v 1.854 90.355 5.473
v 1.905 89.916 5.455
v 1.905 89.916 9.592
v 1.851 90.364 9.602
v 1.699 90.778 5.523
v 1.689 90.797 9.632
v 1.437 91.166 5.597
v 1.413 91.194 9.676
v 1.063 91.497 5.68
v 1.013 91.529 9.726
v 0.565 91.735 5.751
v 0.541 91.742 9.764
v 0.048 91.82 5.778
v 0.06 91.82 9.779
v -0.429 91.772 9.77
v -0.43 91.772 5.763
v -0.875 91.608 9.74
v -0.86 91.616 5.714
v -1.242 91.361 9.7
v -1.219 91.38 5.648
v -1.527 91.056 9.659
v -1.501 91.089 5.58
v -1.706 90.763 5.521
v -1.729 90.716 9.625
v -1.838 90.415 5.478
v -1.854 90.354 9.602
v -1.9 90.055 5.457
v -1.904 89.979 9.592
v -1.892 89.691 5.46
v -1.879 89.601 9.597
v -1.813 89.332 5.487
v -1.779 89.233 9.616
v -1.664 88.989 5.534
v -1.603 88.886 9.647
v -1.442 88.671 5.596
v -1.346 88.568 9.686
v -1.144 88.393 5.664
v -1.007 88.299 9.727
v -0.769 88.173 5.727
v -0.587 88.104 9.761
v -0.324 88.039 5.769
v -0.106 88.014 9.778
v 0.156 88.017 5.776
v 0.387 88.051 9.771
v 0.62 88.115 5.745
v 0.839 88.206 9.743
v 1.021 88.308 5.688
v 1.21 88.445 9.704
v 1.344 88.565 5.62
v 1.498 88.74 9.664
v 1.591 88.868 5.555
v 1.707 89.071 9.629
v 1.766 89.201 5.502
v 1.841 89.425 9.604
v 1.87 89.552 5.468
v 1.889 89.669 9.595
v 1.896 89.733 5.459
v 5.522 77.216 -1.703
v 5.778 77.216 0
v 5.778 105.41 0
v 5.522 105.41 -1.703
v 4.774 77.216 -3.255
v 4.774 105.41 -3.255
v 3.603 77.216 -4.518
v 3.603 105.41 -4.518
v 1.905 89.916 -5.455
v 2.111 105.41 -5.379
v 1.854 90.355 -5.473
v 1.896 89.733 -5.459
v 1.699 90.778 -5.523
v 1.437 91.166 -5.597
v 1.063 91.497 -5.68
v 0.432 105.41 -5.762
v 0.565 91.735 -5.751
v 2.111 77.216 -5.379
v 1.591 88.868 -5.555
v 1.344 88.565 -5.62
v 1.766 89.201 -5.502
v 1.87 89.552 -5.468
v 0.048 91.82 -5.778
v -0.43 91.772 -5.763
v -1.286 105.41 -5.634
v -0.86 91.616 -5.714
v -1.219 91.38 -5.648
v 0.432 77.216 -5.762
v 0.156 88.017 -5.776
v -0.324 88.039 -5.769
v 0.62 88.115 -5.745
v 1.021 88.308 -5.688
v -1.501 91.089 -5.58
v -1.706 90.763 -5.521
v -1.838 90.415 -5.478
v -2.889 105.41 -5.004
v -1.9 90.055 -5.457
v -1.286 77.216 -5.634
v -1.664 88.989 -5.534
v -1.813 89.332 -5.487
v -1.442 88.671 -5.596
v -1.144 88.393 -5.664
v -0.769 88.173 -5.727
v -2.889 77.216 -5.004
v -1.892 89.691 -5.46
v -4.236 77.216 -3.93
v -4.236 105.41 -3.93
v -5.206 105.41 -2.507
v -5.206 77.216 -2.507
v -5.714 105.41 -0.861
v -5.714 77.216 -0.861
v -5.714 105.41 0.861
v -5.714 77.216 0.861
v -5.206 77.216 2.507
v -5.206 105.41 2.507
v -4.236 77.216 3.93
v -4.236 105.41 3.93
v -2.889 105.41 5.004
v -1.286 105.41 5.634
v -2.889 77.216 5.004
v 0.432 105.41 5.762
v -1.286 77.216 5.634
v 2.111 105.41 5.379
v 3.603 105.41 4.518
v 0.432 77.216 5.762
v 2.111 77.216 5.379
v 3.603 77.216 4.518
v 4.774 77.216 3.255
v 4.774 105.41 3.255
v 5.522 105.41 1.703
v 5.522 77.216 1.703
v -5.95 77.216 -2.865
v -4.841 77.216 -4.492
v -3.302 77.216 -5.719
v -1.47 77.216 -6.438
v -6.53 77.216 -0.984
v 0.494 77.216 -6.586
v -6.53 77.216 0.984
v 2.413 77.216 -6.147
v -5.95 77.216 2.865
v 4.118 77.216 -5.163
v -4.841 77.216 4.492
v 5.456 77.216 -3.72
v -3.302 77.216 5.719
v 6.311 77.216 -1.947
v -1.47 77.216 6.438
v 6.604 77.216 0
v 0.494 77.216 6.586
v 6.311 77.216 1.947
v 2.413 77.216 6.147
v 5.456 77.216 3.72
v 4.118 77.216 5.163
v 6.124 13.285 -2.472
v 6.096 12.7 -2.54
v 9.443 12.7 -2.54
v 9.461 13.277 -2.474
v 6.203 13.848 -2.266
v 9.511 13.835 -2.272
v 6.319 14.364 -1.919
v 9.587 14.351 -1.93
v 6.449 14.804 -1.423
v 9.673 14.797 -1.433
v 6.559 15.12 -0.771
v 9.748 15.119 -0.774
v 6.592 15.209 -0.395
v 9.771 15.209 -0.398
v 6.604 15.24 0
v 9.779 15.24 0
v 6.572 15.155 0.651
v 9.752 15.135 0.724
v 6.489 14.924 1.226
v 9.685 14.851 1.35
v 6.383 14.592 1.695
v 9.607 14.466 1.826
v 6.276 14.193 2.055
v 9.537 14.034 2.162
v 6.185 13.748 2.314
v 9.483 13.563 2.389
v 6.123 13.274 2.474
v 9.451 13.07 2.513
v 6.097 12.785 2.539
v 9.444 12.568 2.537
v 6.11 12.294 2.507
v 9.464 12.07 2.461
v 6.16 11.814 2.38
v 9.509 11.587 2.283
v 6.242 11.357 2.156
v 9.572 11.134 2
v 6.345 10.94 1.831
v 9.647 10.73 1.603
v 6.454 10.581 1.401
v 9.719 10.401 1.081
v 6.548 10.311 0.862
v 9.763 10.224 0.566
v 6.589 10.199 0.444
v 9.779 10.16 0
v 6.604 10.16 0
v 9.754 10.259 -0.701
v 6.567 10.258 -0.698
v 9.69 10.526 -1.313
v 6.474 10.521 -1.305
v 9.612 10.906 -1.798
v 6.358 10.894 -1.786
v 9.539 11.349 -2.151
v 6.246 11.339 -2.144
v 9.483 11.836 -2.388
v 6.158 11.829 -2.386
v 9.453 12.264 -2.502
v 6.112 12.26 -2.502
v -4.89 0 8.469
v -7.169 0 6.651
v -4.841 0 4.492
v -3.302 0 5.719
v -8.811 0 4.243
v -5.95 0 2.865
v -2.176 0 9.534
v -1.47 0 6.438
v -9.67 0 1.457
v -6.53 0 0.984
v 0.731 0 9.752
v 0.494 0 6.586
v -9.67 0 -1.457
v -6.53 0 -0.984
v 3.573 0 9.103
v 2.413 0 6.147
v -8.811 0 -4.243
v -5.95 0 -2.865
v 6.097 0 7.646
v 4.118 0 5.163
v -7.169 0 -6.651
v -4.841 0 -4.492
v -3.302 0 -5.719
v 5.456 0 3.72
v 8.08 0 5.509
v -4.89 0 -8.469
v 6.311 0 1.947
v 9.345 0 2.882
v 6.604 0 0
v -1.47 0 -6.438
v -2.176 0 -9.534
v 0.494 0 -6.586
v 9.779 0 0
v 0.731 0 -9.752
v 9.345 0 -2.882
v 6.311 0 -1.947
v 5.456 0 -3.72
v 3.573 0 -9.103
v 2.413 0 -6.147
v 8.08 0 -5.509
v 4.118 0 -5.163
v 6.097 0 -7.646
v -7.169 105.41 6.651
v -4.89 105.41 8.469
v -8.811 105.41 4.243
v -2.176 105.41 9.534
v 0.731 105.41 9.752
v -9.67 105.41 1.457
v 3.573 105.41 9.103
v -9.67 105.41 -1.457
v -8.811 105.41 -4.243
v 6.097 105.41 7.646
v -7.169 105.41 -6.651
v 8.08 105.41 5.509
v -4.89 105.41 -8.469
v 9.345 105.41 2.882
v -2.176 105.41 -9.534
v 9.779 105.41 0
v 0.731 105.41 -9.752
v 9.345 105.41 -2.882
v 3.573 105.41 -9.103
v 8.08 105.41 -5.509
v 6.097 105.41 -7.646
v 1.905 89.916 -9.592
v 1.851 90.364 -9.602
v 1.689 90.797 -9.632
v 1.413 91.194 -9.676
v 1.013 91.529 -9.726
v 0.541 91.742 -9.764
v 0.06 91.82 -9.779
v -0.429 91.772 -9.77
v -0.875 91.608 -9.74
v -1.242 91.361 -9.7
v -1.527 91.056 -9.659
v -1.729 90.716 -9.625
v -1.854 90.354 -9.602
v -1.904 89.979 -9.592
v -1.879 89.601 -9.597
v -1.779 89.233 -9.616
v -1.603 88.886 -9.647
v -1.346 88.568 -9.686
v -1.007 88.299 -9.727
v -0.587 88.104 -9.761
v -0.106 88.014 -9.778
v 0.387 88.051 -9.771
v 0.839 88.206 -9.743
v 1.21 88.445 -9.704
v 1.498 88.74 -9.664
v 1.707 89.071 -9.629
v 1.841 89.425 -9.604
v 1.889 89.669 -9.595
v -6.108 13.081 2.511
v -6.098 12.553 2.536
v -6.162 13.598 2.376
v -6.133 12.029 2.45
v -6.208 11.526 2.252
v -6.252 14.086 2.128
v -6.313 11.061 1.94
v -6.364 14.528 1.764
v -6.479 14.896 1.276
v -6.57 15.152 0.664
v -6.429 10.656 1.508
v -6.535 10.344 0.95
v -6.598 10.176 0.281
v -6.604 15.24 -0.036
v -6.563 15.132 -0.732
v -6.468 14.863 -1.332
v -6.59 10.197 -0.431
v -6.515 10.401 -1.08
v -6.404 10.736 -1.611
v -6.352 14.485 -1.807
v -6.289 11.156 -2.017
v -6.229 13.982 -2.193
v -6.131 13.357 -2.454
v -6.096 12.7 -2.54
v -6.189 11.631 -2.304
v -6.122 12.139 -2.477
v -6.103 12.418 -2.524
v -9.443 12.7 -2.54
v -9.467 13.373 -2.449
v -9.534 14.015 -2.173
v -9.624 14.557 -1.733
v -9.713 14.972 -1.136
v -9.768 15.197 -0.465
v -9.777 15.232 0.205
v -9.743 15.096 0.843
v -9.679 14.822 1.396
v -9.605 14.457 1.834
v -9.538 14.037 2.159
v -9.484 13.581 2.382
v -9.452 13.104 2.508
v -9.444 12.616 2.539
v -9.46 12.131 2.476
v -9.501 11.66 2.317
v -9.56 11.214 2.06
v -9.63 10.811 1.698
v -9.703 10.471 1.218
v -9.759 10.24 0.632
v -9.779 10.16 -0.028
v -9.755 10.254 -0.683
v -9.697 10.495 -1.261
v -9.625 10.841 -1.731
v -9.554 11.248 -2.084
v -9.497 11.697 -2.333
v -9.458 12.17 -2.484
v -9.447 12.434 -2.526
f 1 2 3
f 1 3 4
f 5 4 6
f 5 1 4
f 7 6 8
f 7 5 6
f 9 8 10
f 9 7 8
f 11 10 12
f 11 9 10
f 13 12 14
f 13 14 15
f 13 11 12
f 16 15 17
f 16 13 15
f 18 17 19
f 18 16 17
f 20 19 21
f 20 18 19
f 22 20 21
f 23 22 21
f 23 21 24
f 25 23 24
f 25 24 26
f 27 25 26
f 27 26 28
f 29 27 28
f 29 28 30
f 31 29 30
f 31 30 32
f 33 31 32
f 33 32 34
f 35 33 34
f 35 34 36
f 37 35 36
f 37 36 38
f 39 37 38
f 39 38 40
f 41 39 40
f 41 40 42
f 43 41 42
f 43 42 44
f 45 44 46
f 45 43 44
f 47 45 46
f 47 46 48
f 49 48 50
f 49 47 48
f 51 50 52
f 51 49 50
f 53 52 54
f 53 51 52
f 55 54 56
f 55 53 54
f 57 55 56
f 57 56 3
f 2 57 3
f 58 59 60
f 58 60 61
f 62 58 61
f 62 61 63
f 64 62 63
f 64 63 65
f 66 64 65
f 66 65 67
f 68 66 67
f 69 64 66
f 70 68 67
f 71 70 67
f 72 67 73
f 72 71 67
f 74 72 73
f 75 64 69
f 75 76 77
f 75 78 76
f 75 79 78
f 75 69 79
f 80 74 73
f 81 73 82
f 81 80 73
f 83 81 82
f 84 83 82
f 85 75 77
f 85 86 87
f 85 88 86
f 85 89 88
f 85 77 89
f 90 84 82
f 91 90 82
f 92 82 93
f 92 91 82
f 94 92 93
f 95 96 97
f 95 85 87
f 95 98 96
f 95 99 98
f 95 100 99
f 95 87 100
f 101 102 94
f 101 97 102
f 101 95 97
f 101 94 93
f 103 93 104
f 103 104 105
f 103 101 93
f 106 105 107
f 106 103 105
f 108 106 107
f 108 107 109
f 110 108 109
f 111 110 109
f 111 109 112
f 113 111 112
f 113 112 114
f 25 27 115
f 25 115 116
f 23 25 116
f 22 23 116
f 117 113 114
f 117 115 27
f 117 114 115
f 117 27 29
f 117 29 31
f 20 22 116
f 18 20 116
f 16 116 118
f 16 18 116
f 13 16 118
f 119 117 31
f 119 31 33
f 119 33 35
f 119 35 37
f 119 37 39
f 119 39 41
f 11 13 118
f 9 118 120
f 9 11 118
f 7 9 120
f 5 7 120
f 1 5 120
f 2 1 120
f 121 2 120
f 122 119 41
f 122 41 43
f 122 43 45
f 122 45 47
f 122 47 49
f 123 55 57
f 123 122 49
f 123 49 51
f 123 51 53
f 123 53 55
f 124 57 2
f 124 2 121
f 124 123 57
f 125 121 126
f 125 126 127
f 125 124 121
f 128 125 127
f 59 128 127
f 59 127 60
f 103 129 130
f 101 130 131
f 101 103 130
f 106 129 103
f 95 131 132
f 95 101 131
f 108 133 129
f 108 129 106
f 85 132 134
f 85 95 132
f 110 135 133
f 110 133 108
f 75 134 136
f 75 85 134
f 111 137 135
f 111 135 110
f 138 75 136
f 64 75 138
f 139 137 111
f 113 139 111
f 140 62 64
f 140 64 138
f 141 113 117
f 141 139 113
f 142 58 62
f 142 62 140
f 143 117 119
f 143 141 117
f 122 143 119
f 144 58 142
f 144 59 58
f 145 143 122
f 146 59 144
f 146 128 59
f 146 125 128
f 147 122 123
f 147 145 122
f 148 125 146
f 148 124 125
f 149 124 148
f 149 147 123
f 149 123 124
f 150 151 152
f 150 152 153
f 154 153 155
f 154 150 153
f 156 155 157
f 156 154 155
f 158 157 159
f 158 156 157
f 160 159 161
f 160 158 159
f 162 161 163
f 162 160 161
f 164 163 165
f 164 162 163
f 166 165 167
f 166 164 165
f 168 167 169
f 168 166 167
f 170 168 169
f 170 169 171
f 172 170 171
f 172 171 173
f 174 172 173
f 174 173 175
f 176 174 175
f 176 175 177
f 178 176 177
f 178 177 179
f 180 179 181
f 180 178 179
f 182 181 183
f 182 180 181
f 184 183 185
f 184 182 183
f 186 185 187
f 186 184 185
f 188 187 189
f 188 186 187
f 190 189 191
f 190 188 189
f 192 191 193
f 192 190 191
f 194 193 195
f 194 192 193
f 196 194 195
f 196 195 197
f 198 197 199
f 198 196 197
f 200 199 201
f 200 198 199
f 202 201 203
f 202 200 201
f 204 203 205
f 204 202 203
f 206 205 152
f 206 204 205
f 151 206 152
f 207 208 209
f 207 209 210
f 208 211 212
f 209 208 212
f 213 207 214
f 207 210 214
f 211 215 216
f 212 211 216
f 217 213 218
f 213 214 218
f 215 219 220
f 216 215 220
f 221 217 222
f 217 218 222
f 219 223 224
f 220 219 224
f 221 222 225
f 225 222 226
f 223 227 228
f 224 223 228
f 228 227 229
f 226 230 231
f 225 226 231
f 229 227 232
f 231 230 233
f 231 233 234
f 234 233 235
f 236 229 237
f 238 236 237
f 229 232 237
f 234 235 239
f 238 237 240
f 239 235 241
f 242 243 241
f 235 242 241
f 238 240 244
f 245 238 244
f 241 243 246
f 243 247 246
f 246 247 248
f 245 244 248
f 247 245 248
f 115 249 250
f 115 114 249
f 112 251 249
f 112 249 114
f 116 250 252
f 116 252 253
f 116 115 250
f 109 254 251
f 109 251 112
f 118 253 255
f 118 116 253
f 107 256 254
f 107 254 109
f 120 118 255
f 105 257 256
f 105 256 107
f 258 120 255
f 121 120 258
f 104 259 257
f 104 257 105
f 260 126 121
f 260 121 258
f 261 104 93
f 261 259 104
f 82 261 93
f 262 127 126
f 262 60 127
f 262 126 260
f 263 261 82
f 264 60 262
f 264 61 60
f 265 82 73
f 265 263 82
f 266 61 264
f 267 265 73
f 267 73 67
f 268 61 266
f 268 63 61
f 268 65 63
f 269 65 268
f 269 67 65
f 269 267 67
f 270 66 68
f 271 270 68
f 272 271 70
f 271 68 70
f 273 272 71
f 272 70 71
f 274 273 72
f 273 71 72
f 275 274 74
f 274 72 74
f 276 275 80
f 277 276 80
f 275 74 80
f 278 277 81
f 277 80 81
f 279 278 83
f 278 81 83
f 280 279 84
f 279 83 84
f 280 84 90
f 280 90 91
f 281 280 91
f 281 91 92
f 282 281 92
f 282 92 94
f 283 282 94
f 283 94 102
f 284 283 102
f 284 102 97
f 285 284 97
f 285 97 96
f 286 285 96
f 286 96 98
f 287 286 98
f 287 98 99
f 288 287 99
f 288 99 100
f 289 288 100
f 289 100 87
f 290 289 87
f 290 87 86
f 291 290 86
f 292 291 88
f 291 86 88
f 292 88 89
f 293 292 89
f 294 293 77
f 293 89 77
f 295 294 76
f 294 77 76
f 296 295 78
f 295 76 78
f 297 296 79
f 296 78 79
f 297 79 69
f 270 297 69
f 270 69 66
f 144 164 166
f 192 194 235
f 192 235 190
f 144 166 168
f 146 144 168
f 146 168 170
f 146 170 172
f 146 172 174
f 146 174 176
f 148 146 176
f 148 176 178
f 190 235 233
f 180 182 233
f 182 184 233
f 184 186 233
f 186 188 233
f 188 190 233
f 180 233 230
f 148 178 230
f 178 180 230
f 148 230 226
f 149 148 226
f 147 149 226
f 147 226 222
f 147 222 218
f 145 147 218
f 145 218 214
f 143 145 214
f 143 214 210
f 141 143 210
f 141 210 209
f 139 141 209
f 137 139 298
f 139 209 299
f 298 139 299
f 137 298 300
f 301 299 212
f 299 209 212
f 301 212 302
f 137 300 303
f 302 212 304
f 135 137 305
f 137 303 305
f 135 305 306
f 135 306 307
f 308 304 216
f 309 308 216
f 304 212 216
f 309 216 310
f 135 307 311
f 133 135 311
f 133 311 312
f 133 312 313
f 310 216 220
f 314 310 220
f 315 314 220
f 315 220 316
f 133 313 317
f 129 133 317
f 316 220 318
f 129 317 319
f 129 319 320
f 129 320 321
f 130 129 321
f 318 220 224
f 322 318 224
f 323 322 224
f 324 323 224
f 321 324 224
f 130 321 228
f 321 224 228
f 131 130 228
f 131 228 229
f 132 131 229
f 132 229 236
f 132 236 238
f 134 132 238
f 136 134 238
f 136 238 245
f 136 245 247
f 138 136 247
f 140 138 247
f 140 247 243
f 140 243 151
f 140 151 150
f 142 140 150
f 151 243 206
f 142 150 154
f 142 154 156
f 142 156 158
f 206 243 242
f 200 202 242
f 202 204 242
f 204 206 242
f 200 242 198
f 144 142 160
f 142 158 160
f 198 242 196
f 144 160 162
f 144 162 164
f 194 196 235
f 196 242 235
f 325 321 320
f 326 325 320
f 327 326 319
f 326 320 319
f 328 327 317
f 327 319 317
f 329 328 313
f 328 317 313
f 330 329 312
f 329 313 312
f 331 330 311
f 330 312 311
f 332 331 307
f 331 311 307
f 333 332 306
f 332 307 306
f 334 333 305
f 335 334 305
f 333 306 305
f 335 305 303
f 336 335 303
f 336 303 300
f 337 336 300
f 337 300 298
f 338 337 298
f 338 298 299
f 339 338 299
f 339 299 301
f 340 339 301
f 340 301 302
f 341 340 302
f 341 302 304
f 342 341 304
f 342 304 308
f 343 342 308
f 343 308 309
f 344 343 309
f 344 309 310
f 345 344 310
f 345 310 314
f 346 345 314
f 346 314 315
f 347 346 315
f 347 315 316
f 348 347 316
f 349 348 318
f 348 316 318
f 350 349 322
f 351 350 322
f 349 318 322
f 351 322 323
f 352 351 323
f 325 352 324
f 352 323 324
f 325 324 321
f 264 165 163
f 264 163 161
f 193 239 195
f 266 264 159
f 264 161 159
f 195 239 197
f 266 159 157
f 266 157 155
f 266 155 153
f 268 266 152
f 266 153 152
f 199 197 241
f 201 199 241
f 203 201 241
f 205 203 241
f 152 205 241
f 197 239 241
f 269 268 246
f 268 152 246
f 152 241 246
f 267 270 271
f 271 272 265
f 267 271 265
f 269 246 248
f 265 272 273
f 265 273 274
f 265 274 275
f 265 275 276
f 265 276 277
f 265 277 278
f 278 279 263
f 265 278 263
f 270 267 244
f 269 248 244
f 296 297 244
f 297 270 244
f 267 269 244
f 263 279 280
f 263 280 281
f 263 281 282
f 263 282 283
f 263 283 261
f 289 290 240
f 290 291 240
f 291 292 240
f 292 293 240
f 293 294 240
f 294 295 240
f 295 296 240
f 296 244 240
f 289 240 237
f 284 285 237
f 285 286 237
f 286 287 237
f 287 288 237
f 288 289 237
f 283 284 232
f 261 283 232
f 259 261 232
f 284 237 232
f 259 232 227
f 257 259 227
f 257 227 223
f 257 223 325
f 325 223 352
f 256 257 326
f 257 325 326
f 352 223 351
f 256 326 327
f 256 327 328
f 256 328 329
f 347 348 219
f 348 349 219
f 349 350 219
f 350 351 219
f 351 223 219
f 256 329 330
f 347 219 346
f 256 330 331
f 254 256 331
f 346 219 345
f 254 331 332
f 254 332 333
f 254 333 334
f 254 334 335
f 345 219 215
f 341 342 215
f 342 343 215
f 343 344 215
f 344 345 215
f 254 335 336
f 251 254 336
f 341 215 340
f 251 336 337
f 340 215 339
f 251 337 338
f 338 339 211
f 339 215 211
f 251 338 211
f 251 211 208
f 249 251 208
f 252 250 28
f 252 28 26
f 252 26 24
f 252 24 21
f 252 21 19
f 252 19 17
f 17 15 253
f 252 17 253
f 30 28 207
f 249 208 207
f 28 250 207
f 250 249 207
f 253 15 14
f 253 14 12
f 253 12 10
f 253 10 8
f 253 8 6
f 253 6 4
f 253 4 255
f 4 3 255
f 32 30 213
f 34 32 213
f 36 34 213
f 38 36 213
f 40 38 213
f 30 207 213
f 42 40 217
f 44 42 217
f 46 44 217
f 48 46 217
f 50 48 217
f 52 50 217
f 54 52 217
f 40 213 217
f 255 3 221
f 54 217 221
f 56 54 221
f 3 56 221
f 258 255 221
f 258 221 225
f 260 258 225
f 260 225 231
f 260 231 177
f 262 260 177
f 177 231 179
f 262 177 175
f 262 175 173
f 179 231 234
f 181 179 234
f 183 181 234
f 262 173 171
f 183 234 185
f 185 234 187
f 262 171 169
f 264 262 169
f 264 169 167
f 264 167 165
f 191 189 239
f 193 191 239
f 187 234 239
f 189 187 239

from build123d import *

# Parameters (mm, degrees)
SKETCH1_R               = 9.779
SKETCH1_R_2             = 5.7785
BOSS_EXTRUDE1_DEPTH     = 105.41
SKETCH2_R               = 1.905
CUT_EXTRUDE1_DEPTH      = 10.779
CUT_EXTRUDE1_DEPTH_BACK = 10.779
SKETCH3_R               = 2.54
CUT_EXTRUDE2_DEPTH      = 10.7790001
CUT_EXTRUDE2_DEPTH_BACK = 10.7790001
SKETCH4_R               = 6.604
CUT_EXTRUDE3_DEPTH      = 77.216


with BuildPart() as part:
    # Sketch1 → Boss-Extrude1 (new body)
    with BuildSketch(Plane(origin=(0, 0, 0), x_dir=(1, 0, 0), z_dir=(0, 1, 0))):
        Circle(SKETCH1_R)
        Circle(SKETCH1_R_2, mode=Mode.SUBTRACT)
    extrude(amount=BOSS_EXTRUDE1_DEPTH)

    # Sketch2 → Cut-Extrude1 (cut, two sides)
    with BuildSketch(Plane.XY) as cut_extrude1_sk:
        with Locations((0, 89.916)):
            Circle(SKETCH2_R)
    extrude(amount=CUT_EXTRUDE1_DEPTH, mode=Mode.SUBTRACT)
    extrude(cut_extrude1_sk.sketch, amount=-CUT_EXTRUDE1_DEPTH_BACK, mode=Mode.SUBTRACT)

    # Sketch3 → Cut-Extrude2 (cut, two sides)
    with BuildSketch(Plane(origin=(0, 0, 0), x_dir=(0, 0, -1), z_dir=(1, 0, 0))) as cut_extrude2_sk:
        with Locations((0, 12.7)):
            Circle(SKETCH3_R)
    extrude(amount=CUT_EXTRUDE2_DEPTH, mode=Mode.SUBTRACT)
    extrude(cut_extrude2_sk.sketch, amount=-CUT_EXTRUDE2_DEPTH_BACK, mode=Mode.SUBTRACT)

    # Sketch4 → Cut-Extrude3 (cut)
    with BuildSketch(Plane.XZ):
        Circle(SKETCH4_R)
    extrude(amount=-CUT_EXTRUDE3_DEPTH, mode=Mode.SUBTRACT)


solid = part.part
